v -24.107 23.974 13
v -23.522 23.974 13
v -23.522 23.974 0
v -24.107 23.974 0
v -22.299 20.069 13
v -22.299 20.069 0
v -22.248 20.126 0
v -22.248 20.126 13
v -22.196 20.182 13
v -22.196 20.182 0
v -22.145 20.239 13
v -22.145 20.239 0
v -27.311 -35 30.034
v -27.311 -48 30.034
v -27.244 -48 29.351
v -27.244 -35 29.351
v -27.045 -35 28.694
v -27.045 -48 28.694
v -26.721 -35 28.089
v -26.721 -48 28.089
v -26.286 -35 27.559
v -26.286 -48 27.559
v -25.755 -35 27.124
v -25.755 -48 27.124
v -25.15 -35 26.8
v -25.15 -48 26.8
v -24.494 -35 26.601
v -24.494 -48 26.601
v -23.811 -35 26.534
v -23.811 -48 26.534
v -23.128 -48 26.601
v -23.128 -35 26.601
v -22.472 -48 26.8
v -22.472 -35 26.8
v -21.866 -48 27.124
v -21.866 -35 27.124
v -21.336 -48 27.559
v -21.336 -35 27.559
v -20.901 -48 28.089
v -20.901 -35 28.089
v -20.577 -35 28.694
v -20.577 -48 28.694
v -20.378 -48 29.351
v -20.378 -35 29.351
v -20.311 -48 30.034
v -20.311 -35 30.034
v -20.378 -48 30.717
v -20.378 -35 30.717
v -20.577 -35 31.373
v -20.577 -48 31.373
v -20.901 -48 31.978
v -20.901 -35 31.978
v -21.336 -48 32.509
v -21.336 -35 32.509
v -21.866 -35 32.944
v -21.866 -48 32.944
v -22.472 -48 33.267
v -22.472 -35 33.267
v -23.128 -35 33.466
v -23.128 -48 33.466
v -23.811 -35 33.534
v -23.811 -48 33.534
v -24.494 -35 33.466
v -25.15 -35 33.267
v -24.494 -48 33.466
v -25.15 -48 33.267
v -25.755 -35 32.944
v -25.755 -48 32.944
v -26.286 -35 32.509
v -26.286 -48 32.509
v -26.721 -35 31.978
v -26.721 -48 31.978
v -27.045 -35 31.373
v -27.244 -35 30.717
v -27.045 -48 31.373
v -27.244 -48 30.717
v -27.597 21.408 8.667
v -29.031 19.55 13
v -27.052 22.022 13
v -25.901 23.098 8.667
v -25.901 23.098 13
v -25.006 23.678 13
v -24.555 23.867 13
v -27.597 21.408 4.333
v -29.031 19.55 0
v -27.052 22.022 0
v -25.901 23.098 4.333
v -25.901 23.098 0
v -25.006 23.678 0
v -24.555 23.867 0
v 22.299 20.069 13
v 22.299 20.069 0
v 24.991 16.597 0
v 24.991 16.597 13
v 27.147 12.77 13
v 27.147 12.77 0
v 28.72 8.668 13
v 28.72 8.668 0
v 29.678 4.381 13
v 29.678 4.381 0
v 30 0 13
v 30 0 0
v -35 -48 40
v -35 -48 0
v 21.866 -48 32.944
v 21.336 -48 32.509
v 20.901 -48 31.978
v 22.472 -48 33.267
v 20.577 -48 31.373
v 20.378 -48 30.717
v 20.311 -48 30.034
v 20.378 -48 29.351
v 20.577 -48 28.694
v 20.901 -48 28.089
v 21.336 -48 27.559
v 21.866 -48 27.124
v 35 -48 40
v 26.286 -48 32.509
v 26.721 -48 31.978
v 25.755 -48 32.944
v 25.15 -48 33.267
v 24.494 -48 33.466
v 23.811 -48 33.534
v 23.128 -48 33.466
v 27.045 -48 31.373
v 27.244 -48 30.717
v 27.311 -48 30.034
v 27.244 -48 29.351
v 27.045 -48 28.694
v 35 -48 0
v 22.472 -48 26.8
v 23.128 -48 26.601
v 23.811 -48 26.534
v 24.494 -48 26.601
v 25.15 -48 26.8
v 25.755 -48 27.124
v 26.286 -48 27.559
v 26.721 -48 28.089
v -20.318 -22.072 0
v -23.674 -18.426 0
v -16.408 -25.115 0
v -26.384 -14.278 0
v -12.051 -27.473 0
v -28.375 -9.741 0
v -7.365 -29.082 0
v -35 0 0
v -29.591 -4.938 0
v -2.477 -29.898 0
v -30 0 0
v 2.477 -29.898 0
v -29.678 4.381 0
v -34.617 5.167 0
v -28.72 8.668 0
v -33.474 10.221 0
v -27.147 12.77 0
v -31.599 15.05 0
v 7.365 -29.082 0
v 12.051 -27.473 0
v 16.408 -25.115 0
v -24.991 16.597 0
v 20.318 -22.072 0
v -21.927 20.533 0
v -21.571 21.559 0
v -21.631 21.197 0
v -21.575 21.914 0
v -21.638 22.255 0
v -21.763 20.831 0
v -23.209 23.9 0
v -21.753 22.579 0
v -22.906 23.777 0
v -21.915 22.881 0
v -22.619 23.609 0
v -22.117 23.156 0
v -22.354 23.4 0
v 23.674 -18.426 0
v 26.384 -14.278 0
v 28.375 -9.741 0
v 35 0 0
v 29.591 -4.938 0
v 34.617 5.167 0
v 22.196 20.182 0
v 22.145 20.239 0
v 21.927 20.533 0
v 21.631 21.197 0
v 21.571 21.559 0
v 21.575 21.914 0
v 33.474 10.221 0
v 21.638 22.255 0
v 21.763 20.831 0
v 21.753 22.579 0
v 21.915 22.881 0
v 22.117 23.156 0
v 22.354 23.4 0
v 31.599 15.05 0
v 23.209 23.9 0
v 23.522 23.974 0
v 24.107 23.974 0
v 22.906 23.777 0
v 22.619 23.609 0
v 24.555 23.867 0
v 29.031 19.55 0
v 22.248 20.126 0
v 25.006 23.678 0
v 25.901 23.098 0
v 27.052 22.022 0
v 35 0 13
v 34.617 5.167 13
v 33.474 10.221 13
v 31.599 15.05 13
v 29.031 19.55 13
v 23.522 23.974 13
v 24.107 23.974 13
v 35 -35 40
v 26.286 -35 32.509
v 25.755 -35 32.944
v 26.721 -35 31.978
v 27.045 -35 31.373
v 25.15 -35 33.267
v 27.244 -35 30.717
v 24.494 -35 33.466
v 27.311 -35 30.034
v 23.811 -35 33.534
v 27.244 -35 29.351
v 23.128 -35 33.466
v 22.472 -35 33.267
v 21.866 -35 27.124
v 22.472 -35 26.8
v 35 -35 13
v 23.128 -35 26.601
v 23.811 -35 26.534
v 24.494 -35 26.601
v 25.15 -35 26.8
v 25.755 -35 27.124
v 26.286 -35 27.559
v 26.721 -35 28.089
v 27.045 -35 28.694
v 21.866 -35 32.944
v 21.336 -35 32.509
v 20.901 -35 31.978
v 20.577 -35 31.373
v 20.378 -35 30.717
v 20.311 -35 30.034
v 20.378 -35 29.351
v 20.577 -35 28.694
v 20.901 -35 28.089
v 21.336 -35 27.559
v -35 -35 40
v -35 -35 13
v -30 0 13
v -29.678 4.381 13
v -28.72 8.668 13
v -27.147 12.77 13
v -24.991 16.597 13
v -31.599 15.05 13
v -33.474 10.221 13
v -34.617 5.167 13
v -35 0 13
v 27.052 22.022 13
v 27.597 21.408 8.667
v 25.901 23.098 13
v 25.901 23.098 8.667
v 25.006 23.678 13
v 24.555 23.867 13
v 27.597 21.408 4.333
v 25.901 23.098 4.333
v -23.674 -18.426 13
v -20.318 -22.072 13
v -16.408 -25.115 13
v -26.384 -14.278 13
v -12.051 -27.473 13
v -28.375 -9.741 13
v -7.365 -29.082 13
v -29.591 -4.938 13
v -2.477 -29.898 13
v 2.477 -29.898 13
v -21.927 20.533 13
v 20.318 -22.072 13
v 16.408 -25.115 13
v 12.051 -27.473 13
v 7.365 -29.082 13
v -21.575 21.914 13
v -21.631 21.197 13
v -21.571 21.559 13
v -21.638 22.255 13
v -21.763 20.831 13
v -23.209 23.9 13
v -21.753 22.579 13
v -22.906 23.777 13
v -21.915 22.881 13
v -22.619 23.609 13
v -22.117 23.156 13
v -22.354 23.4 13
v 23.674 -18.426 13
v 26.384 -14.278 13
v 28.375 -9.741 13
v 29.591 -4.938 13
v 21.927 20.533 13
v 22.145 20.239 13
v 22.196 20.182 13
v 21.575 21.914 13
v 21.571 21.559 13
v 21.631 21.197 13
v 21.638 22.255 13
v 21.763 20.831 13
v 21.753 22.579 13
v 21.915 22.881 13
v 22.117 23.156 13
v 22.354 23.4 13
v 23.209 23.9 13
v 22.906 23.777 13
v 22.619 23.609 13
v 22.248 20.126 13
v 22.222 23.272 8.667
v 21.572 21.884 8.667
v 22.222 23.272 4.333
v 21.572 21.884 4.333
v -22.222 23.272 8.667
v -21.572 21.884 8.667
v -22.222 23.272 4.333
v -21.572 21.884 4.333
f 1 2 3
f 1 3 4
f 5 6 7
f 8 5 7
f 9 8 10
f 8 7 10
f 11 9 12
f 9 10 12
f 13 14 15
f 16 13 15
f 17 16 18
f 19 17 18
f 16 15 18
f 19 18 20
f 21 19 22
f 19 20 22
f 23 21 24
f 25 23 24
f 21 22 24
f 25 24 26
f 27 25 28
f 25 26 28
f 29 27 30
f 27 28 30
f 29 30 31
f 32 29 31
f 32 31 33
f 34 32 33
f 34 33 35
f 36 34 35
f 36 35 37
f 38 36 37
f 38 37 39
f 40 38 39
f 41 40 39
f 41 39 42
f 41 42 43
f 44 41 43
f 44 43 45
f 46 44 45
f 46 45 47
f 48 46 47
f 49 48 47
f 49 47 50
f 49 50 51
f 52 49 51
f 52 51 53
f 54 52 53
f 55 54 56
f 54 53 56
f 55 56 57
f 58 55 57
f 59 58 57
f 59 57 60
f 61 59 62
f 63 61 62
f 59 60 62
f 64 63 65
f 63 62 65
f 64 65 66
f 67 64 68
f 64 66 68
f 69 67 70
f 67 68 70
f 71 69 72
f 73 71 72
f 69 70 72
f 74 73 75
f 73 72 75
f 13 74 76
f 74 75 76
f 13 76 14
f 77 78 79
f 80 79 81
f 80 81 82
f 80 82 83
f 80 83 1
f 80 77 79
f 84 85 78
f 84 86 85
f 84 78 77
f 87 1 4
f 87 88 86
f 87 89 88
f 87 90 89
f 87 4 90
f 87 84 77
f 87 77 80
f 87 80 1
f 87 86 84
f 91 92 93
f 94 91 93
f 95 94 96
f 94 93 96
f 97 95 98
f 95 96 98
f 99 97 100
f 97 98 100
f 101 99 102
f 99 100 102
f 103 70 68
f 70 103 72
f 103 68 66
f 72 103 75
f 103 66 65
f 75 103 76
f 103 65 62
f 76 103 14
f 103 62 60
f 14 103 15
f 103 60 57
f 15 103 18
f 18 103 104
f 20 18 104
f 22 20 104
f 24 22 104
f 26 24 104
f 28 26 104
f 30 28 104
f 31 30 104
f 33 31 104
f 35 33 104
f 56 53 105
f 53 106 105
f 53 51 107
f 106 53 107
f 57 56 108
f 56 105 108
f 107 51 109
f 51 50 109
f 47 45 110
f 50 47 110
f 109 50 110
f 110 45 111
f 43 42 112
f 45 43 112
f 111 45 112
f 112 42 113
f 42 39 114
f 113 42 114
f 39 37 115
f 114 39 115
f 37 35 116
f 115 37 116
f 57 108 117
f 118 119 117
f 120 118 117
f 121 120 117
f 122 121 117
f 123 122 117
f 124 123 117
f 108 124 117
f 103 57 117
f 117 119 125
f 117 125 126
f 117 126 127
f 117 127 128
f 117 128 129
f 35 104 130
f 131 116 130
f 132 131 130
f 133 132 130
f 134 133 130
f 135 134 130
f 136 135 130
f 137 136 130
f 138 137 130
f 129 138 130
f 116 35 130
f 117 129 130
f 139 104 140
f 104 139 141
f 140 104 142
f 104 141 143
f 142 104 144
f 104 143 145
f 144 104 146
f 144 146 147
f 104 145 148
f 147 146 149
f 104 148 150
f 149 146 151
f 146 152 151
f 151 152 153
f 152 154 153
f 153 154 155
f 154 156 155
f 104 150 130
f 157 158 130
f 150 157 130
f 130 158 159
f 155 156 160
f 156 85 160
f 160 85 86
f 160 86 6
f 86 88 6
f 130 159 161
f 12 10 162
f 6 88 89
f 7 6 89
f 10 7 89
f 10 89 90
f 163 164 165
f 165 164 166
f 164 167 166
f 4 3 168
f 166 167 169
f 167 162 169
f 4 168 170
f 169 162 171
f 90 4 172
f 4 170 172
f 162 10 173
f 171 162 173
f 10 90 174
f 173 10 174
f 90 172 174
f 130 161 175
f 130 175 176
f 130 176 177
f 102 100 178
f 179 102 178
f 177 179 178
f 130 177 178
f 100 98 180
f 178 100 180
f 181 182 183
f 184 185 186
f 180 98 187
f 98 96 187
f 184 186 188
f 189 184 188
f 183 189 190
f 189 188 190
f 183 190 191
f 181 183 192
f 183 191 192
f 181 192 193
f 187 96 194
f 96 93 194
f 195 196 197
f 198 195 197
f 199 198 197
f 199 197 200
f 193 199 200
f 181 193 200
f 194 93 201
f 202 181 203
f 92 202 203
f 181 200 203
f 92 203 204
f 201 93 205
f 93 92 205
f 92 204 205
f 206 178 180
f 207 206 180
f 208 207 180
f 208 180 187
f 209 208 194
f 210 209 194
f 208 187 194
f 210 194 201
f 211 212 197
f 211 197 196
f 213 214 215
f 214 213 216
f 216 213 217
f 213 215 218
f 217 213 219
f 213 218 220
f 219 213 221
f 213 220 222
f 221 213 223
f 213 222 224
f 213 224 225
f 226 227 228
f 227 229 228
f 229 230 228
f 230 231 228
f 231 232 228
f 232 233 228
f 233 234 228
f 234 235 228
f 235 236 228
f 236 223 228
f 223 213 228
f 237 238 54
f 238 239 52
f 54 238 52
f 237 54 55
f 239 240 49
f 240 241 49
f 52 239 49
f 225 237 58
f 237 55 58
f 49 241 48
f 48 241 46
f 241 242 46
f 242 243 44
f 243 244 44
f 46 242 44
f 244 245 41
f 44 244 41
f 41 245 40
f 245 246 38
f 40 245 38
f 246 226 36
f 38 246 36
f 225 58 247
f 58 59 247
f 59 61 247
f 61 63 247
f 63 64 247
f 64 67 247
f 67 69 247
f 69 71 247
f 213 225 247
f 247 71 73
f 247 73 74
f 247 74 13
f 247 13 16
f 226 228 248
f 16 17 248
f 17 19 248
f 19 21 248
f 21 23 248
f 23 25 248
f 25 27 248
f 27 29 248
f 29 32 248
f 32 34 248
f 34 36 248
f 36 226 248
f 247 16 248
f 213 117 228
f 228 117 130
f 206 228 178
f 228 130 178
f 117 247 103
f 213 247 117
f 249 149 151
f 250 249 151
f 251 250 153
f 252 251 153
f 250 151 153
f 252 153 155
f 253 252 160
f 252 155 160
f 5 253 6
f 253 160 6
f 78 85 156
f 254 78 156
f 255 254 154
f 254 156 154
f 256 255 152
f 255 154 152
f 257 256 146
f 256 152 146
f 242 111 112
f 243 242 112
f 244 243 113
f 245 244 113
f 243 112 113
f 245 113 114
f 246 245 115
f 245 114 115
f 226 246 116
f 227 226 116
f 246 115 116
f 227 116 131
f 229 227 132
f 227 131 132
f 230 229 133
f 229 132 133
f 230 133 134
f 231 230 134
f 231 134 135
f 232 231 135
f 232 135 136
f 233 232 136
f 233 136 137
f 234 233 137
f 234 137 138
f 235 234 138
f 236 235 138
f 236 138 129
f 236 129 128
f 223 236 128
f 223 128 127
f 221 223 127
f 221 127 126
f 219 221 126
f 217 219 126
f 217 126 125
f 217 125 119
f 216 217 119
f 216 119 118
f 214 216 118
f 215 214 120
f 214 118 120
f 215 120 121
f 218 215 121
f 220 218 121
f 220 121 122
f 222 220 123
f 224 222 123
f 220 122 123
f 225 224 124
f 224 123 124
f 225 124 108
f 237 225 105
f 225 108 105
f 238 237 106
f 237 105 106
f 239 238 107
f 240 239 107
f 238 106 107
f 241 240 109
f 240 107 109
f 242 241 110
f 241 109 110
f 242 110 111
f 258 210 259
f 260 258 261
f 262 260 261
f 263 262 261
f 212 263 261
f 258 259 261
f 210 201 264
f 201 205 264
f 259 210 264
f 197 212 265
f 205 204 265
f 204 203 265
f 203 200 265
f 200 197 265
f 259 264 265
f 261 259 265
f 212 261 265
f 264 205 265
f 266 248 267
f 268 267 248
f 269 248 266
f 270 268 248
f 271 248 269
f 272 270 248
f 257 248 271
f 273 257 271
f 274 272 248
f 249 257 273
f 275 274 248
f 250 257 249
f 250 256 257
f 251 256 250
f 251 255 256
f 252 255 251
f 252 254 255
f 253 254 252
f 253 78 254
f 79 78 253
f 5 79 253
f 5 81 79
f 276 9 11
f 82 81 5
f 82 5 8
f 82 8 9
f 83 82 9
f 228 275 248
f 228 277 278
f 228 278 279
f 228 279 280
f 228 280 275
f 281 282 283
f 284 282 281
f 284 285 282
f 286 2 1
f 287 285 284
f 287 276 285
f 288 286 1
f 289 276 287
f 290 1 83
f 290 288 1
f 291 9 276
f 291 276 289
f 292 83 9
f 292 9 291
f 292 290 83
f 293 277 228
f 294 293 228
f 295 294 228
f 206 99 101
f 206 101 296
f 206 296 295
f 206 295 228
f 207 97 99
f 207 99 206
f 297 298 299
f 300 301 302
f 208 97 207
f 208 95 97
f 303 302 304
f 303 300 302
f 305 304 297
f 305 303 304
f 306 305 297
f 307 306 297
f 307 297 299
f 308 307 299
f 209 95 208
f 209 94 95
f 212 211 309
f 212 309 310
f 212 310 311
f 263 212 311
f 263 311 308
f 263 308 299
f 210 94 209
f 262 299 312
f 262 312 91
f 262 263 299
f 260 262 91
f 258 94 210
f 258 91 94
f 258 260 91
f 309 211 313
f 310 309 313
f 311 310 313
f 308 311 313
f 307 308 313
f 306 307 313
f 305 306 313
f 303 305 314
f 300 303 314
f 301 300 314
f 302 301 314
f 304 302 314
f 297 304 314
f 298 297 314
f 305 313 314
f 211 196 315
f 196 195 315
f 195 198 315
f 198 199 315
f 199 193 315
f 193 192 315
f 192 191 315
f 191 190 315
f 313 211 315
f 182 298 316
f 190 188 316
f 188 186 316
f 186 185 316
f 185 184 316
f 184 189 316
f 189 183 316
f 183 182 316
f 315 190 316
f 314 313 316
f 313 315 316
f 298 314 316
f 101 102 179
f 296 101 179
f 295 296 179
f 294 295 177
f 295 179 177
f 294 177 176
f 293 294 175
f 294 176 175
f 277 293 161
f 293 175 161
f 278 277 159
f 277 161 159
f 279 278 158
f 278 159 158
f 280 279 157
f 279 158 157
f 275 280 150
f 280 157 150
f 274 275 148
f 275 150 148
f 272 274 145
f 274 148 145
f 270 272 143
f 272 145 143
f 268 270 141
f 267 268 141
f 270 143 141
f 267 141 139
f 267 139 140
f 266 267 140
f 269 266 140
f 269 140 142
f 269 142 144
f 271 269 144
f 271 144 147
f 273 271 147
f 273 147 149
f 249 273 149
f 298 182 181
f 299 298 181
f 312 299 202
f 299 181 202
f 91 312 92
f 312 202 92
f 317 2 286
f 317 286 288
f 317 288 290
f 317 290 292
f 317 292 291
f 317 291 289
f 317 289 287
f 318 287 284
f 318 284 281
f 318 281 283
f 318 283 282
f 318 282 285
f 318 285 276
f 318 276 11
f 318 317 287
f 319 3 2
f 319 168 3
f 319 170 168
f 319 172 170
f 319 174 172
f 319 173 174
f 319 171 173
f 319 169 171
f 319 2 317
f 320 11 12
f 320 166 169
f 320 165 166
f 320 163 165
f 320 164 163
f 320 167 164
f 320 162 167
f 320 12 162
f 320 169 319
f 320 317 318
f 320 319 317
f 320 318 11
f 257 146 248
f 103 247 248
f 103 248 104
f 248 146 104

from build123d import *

# Parameters (mm, degrees)
F1_DEPTH = 13
F2_DEPTH = 40
F4_D     = 7


with BuildPart() as f1:
    # F0 (on Top) → F1 (new body)
    with BuildSketch(Plane.XY):
        with BuildLine():
            Line((30, 0), (35, 0))
            ThreePointArc((35, 0), (33.4744278282, 10.2206986834), (29.0307039098, 19.5504023104))
            add(Edge.make_bspline(
                [(29.0307039098, 19.5504023104), (27.7822040528, 21.275593448), (25.8954088148, 23.7212759458), (24.10664395, 23.9739441895)],
                knots=[0, 0, 0, 0, 0.5116358428, 0.5116358428, 0.5116358428, 0.5116358428], degree=3))
            Line((24.10664395, 23.9739441895), (23.5215793736, 23.9739441895))
            add(Edge.make_bspline(
                [(23.5215793736, 23.9739441895), (22.0865673396, 23.7581691141), (20.7707318469, 21.8685279115), (22.1448074946, 20.2387623393)],
                knots=[0.56784893, 0.56784893, 0.56784893, 0.56784893, 0.9854049804, 0.9854049804, 0.9854049804, 0.9854049804], degree=3))
            ThreePointArc((22.1448074946, 20.2387623393), (22.2219972589, 20.1539782134), (22.2988624189, 20.0688996914))
            ThreePointArc((22.2988624189, 20.0688996914), (28.0086225346, 10.7478864767), (30, 0))
        make_face()
        with BuildLine():
            Line((-35, -35), (0, -35))
            ThreePointArc((0, -35), (24.7487373415, -24.7487373415), (35, 0))
            Line((35, 0), (30, 0))
            ThreePointArc((30, 0), (0, -30), (-30, 0))
            ThreePointArc((-30, 0), (-28.0086225346, 10.7478864767), (-22.2988624189, 20.0688996914))
            ThreePointArc((-22.2988624189, 20.0688996914), (-22.2219972589, 20.1539782134), (-22.1448074946, 20.2387623393))
            add(Edge.make_bspline(
                [(-23.5215793736, 23.9739441895), (-22.0865673396, 23.7581691141), (-20.7707318469, 21.8685279115), (-22.1448074946, 20.2387623393)],
                knots=[0.56784893, 0.56784893, 0.56784893, 0.56784893, 0.9854049804, 0.9854049804, 0.9854049804, 0.9854049804], degree=3))
            Line((-23.5215793736, 23.9739441895), (-24.10664395, 23.9739441895))
            add(Edge.make_bspline(
                [(-29.0307039098, 19.5504023104), (-27.7822040528, 21.275593448), (-25.8954088148, 23.7212759458), (-24.10664395, 23.9739441895)],
                knots=[0, 0, 0, 0, 0.5116358428, 0.5116358428, 0.5116358428, 0.5116358428], degree=3))
            ThreePointArc((-29.0307039098, 19.5504023104), (-33.4744278282, 10.2206986834), (-35, 0))
            Line((-35, 0), (-35, -35))
        make_face()
        with BuildLine():
            ThreePointArc((35, 0), (24.7487373415, -24.7487373415), (0, -35))
            Line((0, -35), (35, -35))
            Line((35, -35), (35, 0))
        make_face()
        Polygon((35, -35), (0, -35), (-35, -35), (-35, -48), (35, -48), align=None)
    extrude(amount=F1_DEPTH)

    # F0 (on Top) → F2 (join)
    with BuildSketch(Plane.XY):
        Polygon((35, -35), (0, -35), (-35, -35), (-35, -48), (35, -48), align=None)
    extrude(amount=F2_DEPTH)

    # F4 (through all)
    with Locations(Plane(origin=(0, 0, 0), x_dir=(1, 0, 0), z_dir=(0, 1, 0))):
        with Locations((-23.8109529018, -30.0336983055), (23.8109529018, -30.0336983055)):
            Hole(F4_D / 2)


solid = f1.part
